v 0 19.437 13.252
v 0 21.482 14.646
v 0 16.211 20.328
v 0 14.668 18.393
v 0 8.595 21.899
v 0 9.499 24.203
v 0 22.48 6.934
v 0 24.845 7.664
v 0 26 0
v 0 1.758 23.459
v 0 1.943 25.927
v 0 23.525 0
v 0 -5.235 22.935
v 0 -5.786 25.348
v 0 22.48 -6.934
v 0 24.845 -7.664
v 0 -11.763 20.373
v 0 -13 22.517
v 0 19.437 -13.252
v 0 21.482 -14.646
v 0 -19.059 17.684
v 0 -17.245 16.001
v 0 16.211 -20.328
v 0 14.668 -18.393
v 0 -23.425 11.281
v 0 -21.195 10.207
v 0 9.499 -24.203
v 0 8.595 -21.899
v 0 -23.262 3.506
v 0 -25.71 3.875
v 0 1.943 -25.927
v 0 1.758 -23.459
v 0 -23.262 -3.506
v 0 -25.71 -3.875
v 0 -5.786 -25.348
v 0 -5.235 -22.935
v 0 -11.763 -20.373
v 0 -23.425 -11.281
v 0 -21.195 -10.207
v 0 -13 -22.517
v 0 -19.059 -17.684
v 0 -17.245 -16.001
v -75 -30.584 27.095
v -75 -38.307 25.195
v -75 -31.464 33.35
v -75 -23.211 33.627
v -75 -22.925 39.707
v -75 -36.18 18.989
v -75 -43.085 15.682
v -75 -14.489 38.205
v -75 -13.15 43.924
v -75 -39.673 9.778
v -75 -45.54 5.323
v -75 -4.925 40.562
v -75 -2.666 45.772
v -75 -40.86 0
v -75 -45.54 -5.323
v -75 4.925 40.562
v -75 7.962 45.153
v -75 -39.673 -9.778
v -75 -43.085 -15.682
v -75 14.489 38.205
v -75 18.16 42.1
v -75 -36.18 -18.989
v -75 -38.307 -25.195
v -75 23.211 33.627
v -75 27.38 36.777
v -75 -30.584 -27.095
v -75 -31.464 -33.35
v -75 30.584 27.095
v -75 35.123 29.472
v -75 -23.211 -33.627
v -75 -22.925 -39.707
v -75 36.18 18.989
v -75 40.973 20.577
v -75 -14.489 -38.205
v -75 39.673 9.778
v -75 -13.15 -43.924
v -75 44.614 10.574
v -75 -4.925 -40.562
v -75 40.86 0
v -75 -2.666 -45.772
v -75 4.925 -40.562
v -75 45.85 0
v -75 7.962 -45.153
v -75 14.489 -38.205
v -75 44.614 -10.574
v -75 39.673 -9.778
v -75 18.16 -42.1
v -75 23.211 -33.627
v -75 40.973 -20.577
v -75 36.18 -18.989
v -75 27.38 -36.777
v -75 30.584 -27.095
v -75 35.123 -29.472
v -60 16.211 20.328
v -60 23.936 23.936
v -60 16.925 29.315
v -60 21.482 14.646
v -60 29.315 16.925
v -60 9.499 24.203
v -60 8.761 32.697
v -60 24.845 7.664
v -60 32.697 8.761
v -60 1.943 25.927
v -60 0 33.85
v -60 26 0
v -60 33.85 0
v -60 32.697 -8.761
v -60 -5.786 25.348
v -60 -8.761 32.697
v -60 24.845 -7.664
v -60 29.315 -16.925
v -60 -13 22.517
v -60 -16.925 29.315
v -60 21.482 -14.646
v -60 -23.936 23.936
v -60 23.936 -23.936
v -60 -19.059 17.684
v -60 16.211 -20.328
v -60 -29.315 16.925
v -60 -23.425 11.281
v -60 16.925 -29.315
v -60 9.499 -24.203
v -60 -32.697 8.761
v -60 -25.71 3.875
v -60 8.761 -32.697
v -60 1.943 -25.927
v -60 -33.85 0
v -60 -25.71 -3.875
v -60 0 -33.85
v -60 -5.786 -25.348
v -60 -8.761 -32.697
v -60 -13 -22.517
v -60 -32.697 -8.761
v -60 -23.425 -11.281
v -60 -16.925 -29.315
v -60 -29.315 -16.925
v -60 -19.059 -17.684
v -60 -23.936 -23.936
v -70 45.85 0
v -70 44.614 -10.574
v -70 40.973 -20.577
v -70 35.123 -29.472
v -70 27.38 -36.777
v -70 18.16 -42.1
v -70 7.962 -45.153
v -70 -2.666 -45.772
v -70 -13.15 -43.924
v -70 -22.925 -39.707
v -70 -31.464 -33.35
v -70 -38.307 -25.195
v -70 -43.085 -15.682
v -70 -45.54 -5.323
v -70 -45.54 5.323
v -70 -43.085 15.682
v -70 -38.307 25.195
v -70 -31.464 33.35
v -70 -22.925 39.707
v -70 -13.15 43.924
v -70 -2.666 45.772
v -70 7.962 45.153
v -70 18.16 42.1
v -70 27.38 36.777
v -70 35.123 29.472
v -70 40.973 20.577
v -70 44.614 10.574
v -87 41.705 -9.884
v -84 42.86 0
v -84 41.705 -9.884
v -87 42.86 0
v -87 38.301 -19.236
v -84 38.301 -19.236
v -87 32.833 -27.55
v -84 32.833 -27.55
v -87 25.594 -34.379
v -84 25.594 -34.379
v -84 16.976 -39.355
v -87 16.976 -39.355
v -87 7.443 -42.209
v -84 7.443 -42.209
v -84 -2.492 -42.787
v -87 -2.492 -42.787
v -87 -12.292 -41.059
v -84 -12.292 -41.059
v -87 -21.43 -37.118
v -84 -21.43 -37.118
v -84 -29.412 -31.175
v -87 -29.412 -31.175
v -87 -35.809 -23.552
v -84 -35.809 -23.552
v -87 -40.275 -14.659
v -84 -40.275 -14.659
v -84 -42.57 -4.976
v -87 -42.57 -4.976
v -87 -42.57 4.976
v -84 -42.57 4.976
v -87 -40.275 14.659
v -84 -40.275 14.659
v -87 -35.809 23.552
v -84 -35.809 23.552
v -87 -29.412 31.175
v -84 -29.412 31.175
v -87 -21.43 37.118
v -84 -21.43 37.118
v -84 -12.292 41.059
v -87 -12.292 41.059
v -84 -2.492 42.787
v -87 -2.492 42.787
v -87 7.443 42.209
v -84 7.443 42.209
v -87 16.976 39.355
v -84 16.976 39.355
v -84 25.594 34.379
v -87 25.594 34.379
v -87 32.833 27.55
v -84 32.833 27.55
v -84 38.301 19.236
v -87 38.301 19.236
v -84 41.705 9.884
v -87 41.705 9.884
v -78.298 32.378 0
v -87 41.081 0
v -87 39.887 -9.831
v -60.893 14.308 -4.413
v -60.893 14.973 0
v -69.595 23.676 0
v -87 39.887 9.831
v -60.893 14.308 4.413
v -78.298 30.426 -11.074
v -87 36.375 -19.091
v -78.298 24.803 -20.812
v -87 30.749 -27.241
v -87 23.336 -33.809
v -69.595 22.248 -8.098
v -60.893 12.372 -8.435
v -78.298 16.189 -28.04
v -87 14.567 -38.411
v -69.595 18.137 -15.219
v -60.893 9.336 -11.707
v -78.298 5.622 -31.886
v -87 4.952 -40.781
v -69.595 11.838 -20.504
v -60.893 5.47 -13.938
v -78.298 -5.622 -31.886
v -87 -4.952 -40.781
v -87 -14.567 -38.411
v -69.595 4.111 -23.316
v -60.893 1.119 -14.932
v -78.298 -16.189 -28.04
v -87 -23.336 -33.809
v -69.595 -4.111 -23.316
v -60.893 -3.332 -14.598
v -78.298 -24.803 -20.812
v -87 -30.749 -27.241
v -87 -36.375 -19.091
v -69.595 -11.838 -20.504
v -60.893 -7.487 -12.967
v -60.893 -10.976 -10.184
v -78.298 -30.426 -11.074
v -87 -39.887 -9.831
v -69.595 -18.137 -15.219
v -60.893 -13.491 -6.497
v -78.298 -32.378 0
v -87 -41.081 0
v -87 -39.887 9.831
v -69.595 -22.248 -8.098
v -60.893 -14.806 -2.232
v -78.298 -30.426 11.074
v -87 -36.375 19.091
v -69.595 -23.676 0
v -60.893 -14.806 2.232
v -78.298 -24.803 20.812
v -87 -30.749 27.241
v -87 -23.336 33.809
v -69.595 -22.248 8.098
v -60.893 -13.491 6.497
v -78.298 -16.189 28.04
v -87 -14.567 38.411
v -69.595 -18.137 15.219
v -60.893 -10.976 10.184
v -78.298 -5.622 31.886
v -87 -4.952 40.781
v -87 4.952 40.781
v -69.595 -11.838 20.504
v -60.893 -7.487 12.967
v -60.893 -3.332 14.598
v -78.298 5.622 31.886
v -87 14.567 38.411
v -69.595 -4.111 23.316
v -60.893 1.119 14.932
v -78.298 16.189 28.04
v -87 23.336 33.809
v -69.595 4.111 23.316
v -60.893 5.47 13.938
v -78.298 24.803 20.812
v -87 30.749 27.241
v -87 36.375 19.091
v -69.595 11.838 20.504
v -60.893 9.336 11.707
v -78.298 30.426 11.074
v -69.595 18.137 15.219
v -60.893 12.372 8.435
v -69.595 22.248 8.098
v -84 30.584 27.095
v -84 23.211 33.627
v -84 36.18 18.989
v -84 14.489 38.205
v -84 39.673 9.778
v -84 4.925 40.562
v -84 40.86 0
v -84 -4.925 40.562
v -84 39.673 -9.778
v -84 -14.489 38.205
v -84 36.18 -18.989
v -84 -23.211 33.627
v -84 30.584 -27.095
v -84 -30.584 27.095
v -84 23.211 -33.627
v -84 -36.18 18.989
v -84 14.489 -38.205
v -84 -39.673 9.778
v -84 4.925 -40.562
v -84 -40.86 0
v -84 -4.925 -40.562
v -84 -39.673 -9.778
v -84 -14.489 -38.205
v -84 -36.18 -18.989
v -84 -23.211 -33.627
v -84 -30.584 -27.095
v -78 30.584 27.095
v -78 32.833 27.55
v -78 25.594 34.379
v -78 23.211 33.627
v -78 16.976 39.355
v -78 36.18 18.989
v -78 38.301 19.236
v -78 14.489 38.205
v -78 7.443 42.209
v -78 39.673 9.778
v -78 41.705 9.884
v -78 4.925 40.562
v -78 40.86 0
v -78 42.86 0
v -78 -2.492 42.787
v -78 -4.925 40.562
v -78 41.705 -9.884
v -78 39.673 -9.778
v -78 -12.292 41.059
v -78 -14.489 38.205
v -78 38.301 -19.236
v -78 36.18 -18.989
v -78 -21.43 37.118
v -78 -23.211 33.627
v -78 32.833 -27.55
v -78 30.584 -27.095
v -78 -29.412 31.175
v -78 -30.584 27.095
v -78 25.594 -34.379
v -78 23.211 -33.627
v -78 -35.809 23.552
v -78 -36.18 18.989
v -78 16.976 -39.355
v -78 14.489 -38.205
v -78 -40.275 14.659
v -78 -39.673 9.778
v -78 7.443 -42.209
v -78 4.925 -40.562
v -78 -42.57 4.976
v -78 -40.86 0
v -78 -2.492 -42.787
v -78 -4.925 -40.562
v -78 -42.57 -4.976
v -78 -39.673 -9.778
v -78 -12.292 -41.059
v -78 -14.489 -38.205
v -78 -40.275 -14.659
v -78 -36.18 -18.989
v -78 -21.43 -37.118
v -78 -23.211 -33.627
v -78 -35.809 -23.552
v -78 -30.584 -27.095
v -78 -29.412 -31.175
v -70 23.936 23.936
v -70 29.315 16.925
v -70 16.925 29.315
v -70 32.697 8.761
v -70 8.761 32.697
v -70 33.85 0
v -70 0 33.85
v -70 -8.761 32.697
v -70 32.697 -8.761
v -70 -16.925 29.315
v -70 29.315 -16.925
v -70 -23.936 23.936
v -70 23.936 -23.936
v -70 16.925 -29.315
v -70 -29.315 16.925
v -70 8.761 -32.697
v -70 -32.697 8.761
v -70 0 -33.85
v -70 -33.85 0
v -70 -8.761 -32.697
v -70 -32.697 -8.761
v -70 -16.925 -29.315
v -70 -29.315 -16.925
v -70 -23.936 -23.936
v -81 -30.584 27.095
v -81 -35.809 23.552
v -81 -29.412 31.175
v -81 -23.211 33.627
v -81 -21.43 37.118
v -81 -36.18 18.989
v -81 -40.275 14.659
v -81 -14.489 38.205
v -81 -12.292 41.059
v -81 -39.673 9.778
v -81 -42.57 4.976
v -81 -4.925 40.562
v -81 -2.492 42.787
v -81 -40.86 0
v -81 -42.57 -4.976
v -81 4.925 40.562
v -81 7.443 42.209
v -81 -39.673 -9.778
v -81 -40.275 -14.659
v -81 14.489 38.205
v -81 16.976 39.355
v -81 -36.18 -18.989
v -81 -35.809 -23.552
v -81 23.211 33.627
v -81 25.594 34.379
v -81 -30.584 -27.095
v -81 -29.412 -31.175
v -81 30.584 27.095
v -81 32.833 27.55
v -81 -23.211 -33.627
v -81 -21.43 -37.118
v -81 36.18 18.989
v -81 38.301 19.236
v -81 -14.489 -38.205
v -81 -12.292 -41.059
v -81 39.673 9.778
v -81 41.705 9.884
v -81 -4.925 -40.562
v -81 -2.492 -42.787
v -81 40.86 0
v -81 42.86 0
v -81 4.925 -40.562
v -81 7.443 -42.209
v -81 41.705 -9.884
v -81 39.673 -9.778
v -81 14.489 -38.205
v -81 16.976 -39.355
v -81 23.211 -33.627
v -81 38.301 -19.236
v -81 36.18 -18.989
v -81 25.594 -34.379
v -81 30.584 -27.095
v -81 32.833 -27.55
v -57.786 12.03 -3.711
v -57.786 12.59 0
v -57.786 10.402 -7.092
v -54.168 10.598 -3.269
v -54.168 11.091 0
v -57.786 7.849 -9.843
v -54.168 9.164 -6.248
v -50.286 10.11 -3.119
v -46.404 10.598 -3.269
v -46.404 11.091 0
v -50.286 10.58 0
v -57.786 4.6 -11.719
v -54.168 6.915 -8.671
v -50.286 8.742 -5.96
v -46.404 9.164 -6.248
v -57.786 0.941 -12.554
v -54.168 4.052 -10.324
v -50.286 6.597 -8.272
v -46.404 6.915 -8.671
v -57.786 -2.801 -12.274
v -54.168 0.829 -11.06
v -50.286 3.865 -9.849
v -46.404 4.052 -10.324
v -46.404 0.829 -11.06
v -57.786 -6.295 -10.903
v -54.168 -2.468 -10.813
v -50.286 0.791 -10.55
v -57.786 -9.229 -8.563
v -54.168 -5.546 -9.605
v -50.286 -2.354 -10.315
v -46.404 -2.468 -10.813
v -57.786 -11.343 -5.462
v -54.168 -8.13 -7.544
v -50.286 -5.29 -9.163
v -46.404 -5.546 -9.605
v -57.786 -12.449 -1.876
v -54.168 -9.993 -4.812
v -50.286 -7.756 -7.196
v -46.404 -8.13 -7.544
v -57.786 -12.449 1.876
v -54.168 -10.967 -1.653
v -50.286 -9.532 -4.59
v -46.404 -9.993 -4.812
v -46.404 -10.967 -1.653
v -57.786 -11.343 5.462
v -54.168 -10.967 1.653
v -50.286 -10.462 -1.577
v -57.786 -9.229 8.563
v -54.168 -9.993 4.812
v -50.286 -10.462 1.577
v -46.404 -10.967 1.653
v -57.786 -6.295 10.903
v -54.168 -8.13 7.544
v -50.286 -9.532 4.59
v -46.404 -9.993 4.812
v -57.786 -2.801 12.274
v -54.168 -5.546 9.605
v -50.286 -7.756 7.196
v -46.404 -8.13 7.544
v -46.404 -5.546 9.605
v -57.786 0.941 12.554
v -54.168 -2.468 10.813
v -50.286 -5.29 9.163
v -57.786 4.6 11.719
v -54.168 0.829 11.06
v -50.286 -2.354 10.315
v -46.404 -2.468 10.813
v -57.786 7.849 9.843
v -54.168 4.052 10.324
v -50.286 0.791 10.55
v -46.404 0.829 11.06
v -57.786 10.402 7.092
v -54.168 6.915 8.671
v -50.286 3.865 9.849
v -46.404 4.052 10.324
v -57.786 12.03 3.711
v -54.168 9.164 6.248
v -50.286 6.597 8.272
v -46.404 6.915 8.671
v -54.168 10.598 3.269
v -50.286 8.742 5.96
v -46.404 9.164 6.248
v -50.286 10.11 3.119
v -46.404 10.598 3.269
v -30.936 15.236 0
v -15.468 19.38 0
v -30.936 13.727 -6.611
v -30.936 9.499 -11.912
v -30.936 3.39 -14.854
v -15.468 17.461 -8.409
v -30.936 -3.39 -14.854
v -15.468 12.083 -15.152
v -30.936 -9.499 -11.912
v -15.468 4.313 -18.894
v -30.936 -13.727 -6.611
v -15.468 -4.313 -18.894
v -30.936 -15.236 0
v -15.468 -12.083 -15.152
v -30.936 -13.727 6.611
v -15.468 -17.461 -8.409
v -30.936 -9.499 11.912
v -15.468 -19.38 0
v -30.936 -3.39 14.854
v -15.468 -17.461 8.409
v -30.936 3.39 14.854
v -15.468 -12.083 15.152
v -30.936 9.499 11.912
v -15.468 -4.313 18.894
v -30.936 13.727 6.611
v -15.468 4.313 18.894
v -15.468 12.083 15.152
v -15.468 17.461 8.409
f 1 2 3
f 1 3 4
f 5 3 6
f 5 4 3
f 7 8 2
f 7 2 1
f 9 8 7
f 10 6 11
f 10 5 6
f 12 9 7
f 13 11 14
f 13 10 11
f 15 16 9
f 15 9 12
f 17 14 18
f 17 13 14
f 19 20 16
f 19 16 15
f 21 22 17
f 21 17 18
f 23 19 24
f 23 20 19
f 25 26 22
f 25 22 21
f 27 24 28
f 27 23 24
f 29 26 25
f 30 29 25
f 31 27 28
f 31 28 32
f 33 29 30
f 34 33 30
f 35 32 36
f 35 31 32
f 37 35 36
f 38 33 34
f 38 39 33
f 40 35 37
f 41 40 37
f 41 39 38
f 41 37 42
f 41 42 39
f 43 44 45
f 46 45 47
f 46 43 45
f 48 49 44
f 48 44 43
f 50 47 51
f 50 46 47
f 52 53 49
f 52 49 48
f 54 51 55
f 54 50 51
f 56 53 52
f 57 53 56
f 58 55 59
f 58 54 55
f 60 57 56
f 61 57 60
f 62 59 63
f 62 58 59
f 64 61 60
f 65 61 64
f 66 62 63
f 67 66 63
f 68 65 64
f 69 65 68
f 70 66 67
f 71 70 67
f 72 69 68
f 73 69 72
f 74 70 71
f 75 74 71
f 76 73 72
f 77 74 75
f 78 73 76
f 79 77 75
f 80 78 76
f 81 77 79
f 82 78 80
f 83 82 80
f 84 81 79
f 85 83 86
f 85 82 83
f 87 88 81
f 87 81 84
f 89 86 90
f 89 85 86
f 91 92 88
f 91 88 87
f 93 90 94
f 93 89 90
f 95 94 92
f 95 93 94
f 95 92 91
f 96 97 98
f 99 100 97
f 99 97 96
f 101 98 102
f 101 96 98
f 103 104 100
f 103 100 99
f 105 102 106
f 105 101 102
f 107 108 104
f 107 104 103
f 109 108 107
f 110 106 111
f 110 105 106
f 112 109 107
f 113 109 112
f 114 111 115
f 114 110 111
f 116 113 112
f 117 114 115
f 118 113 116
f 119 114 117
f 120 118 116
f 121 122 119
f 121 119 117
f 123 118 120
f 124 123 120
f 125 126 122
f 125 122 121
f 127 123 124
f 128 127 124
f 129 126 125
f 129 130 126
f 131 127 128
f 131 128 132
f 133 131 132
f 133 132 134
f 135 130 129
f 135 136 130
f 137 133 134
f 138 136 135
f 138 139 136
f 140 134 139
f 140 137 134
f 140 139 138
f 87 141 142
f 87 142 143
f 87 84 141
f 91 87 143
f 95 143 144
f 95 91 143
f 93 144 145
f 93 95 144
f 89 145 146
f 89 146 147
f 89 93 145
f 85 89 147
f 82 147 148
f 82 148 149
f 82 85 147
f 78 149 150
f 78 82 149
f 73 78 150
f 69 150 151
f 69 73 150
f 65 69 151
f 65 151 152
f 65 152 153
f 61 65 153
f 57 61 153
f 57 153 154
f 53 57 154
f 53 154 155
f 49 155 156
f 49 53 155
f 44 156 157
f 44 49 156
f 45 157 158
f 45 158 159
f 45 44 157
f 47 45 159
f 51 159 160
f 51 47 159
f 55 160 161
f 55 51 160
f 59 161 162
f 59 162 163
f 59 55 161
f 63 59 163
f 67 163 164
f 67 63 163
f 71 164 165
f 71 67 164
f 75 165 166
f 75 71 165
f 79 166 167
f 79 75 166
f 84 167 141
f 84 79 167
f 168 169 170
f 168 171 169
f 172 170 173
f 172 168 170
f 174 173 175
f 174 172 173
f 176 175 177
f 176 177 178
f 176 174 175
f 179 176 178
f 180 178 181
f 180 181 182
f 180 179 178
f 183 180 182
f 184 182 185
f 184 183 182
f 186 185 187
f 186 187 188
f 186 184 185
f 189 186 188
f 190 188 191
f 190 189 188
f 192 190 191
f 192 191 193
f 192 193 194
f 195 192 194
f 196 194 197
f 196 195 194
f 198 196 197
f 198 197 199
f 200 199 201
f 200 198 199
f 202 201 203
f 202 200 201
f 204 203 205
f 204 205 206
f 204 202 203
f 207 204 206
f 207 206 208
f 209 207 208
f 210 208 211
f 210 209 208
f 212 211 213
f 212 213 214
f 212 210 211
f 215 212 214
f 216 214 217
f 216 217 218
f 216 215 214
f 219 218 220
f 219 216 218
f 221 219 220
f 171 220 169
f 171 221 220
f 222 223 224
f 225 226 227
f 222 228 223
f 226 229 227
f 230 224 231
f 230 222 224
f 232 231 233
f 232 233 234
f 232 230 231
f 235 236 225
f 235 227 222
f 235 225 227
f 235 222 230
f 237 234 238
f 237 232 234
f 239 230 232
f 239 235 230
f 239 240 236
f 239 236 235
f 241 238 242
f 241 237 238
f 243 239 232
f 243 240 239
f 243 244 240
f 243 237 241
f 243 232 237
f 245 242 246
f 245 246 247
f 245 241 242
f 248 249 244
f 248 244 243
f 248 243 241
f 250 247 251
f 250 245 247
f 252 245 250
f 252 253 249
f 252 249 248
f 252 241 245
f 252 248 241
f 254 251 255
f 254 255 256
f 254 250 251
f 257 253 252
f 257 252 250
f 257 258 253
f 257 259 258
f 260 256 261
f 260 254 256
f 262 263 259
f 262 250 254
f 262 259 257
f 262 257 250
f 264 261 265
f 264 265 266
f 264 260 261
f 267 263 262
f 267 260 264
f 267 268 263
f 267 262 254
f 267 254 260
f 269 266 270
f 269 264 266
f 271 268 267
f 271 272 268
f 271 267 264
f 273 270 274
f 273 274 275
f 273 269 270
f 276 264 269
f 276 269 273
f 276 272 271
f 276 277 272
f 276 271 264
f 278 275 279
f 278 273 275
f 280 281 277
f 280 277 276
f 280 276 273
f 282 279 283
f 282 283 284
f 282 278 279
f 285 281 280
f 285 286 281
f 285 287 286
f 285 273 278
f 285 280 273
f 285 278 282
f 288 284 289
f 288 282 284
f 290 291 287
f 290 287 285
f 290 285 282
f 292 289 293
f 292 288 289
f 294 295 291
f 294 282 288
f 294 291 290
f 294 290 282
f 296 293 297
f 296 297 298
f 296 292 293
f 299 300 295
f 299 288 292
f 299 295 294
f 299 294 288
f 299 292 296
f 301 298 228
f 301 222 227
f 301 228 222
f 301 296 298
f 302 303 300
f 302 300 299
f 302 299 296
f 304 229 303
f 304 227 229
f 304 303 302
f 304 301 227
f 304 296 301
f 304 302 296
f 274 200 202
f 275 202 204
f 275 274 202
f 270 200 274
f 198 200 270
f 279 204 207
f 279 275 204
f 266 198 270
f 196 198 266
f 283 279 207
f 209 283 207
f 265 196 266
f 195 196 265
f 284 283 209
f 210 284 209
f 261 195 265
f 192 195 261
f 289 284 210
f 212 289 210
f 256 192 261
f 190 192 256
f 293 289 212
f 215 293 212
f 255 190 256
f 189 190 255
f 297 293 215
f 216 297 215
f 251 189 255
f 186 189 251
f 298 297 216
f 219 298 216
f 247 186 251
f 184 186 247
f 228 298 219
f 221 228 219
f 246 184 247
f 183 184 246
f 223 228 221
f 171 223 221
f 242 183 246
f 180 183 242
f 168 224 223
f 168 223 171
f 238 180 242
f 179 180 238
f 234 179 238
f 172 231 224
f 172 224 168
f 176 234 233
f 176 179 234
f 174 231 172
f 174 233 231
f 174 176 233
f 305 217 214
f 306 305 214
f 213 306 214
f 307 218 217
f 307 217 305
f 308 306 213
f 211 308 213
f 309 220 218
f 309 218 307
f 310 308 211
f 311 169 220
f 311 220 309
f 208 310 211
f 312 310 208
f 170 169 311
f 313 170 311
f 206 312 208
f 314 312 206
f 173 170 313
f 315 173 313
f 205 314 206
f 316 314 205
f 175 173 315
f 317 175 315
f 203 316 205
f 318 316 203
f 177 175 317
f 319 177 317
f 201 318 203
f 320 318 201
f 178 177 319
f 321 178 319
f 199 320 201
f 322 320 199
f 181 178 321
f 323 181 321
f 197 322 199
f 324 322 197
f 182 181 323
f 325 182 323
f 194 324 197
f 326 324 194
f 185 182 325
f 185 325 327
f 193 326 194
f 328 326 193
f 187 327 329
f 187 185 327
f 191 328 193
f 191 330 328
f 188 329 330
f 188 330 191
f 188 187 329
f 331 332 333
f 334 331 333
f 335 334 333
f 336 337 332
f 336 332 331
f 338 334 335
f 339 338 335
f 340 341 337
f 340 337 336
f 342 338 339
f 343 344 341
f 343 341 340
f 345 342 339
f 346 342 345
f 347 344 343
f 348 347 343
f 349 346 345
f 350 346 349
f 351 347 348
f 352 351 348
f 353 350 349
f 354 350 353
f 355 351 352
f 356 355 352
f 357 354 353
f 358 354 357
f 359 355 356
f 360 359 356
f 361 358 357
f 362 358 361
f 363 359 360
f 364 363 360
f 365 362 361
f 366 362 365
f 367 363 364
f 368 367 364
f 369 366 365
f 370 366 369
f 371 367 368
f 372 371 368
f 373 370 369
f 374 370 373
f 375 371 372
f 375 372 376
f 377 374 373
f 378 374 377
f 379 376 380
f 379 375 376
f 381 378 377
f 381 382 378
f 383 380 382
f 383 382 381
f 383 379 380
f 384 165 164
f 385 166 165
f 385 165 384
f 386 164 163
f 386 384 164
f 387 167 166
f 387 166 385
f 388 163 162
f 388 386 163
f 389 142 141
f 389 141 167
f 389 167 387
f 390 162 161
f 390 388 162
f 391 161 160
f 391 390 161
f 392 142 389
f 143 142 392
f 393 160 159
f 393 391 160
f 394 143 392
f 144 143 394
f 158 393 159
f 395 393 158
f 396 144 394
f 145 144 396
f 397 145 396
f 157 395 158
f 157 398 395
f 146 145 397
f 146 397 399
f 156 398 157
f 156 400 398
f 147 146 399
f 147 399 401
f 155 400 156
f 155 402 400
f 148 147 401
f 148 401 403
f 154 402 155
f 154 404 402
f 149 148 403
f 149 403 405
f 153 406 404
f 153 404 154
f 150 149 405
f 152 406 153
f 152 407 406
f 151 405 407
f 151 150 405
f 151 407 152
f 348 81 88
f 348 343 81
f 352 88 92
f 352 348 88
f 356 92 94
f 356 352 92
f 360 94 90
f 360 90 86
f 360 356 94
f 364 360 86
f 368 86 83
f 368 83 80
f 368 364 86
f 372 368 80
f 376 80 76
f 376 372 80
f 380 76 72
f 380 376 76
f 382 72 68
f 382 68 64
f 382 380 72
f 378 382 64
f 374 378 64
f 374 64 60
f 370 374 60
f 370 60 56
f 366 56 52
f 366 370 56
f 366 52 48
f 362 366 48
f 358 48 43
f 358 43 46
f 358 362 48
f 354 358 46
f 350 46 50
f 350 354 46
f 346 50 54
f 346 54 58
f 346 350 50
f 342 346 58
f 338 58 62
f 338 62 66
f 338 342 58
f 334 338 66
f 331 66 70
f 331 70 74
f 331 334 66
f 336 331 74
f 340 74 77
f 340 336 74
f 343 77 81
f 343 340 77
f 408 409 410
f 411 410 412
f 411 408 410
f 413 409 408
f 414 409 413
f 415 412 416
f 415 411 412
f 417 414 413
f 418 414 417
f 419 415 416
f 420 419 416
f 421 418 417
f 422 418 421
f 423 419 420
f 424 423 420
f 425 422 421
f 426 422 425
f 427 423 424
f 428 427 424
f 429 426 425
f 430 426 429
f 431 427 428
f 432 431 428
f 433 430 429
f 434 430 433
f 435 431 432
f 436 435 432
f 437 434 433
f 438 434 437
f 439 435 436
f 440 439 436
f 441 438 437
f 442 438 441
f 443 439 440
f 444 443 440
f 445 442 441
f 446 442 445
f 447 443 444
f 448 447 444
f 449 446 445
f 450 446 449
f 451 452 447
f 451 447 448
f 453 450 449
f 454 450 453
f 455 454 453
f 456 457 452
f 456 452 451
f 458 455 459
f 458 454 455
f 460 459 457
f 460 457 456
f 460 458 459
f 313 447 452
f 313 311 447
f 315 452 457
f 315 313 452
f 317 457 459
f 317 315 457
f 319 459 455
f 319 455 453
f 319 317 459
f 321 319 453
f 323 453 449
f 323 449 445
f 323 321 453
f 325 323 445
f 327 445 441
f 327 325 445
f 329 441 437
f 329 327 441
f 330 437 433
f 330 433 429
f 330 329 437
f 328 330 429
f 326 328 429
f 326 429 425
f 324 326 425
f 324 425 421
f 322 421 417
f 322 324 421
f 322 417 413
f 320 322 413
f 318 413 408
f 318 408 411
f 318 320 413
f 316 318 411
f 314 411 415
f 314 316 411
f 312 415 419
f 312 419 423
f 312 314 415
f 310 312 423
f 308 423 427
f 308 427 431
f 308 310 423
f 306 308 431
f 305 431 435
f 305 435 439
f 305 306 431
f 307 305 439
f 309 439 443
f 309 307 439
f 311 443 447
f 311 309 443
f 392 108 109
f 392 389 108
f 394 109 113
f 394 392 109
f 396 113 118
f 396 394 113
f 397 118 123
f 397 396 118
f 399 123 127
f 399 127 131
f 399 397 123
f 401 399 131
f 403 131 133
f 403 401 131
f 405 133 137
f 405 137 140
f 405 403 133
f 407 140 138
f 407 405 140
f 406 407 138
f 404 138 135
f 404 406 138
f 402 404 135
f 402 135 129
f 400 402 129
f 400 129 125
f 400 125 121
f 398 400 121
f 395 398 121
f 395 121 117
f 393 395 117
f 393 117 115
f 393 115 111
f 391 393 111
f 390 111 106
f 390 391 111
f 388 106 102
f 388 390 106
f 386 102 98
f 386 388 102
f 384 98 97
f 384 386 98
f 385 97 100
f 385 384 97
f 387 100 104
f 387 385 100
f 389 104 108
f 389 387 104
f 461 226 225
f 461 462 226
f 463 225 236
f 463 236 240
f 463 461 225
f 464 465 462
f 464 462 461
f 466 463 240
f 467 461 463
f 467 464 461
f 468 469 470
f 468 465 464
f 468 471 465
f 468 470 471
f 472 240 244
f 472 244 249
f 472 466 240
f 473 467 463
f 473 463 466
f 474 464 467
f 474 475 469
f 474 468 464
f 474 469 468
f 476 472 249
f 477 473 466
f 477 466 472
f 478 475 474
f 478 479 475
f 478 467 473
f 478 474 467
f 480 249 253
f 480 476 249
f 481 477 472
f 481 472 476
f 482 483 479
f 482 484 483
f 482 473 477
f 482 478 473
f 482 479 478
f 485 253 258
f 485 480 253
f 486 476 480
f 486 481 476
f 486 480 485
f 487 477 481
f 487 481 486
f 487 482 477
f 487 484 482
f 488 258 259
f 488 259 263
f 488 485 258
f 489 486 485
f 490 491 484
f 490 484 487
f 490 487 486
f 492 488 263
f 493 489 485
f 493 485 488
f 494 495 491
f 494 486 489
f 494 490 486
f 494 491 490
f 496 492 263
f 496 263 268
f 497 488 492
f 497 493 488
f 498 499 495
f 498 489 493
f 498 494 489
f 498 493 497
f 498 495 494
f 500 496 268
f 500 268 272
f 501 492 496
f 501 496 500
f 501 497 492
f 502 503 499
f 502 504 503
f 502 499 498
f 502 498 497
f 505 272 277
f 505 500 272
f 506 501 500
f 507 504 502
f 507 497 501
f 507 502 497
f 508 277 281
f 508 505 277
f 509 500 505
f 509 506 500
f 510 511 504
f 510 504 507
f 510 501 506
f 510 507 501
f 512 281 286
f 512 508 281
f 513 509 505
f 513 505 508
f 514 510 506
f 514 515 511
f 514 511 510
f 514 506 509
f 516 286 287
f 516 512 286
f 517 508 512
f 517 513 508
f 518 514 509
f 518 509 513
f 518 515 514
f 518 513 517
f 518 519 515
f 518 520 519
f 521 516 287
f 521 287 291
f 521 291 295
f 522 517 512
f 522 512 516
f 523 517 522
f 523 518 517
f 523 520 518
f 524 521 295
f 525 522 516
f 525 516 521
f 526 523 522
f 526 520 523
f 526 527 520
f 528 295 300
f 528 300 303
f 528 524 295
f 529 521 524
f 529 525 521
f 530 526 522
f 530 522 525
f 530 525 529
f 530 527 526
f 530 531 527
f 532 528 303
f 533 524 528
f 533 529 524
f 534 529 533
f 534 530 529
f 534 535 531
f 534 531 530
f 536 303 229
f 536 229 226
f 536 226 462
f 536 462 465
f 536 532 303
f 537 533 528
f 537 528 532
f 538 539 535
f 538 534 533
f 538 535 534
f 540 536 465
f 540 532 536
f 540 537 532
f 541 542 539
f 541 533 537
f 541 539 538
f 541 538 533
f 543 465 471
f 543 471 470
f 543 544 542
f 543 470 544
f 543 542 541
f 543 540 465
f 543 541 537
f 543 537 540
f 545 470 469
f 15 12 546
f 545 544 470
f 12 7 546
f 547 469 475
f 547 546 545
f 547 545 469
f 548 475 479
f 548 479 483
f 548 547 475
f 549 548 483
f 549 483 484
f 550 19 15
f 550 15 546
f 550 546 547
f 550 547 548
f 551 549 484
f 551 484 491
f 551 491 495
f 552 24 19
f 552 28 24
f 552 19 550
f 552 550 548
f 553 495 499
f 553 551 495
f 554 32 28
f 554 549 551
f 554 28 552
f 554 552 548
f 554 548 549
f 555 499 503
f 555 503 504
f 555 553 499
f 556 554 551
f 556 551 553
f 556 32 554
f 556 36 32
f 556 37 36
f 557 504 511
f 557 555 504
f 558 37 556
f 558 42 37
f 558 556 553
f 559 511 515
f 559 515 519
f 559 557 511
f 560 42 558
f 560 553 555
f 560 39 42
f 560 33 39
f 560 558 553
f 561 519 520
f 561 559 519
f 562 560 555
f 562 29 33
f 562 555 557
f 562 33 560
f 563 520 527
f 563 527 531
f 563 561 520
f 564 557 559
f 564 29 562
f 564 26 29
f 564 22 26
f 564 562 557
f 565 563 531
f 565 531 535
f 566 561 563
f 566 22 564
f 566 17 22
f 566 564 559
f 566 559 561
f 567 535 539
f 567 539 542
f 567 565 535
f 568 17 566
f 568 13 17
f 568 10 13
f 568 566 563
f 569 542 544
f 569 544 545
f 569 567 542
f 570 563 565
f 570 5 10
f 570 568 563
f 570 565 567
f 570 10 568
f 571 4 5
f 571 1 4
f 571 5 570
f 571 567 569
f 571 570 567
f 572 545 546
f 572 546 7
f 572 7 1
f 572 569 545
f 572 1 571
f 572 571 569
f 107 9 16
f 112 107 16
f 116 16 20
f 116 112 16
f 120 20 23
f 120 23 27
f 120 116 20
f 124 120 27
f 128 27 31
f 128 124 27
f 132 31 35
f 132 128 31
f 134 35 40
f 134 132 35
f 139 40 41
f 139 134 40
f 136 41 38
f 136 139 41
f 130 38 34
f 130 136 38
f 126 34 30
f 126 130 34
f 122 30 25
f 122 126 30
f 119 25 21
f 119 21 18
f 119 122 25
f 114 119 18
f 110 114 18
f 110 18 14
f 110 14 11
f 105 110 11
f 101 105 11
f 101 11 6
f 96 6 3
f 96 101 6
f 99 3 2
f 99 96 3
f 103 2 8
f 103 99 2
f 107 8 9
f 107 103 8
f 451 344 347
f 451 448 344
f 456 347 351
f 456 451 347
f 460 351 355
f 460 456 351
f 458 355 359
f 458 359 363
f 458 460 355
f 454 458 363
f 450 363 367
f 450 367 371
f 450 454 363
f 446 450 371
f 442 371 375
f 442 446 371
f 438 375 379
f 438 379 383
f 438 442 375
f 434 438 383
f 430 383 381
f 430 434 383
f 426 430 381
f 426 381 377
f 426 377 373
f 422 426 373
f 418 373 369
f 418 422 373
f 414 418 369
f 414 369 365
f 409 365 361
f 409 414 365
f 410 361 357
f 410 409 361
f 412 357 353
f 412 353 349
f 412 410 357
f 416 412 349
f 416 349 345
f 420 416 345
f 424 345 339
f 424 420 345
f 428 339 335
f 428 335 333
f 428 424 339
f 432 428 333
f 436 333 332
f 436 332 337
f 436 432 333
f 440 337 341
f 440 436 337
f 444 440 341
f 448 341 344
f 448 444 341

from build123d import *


with BuildPart() as part:
    # Sketch1 → Revolve1 (revolve)
    with BuildSketch(Plane.XY):
        with BuildLine():
            Line((-87, 41.080611397), (-60.892786886, 14.973398282))
            ThreePointArc((-60.892786886, 14.973398282), (-54.168470844, 11.091112606), (-46.403899491, 11.091112606))
            Line((-46.403899491, 11.091112606), (0, 23.525))
            Line((0, 23.525), (0, 26))
            Line((0, 26), (-60, 26))
            Line((-60, 26), (-60, 33.85))
            Line((-60, 33.85), (-70, 33.85))
            Line((-70, 33.85), (-70, 45.85))
            Line((-70, 45.85), (-75, 45.85))
            Line((-75, 45.85), (-75, 40.86))
            Line((-75, 40.86), (-78, 40.86))
            Line((-78, 40.86), (-78, 42.86))
            Line((-78, 42.86), (-81, 42.86))
            Line((-81, 42.86), (-81, 40.86))
            Line((-81, 40.86), (-84, 40.86))
            Line((-84, 40.86), (-84, 42.86))
            Line((-84, 42.86), (-87, 42.86))
            Line((-87, 42.86), (-87, 41.080611397))
        make_face()
    revolve(axis=Axis((0, 0, 0), (-1, 0, 0)))


solid = part.part
